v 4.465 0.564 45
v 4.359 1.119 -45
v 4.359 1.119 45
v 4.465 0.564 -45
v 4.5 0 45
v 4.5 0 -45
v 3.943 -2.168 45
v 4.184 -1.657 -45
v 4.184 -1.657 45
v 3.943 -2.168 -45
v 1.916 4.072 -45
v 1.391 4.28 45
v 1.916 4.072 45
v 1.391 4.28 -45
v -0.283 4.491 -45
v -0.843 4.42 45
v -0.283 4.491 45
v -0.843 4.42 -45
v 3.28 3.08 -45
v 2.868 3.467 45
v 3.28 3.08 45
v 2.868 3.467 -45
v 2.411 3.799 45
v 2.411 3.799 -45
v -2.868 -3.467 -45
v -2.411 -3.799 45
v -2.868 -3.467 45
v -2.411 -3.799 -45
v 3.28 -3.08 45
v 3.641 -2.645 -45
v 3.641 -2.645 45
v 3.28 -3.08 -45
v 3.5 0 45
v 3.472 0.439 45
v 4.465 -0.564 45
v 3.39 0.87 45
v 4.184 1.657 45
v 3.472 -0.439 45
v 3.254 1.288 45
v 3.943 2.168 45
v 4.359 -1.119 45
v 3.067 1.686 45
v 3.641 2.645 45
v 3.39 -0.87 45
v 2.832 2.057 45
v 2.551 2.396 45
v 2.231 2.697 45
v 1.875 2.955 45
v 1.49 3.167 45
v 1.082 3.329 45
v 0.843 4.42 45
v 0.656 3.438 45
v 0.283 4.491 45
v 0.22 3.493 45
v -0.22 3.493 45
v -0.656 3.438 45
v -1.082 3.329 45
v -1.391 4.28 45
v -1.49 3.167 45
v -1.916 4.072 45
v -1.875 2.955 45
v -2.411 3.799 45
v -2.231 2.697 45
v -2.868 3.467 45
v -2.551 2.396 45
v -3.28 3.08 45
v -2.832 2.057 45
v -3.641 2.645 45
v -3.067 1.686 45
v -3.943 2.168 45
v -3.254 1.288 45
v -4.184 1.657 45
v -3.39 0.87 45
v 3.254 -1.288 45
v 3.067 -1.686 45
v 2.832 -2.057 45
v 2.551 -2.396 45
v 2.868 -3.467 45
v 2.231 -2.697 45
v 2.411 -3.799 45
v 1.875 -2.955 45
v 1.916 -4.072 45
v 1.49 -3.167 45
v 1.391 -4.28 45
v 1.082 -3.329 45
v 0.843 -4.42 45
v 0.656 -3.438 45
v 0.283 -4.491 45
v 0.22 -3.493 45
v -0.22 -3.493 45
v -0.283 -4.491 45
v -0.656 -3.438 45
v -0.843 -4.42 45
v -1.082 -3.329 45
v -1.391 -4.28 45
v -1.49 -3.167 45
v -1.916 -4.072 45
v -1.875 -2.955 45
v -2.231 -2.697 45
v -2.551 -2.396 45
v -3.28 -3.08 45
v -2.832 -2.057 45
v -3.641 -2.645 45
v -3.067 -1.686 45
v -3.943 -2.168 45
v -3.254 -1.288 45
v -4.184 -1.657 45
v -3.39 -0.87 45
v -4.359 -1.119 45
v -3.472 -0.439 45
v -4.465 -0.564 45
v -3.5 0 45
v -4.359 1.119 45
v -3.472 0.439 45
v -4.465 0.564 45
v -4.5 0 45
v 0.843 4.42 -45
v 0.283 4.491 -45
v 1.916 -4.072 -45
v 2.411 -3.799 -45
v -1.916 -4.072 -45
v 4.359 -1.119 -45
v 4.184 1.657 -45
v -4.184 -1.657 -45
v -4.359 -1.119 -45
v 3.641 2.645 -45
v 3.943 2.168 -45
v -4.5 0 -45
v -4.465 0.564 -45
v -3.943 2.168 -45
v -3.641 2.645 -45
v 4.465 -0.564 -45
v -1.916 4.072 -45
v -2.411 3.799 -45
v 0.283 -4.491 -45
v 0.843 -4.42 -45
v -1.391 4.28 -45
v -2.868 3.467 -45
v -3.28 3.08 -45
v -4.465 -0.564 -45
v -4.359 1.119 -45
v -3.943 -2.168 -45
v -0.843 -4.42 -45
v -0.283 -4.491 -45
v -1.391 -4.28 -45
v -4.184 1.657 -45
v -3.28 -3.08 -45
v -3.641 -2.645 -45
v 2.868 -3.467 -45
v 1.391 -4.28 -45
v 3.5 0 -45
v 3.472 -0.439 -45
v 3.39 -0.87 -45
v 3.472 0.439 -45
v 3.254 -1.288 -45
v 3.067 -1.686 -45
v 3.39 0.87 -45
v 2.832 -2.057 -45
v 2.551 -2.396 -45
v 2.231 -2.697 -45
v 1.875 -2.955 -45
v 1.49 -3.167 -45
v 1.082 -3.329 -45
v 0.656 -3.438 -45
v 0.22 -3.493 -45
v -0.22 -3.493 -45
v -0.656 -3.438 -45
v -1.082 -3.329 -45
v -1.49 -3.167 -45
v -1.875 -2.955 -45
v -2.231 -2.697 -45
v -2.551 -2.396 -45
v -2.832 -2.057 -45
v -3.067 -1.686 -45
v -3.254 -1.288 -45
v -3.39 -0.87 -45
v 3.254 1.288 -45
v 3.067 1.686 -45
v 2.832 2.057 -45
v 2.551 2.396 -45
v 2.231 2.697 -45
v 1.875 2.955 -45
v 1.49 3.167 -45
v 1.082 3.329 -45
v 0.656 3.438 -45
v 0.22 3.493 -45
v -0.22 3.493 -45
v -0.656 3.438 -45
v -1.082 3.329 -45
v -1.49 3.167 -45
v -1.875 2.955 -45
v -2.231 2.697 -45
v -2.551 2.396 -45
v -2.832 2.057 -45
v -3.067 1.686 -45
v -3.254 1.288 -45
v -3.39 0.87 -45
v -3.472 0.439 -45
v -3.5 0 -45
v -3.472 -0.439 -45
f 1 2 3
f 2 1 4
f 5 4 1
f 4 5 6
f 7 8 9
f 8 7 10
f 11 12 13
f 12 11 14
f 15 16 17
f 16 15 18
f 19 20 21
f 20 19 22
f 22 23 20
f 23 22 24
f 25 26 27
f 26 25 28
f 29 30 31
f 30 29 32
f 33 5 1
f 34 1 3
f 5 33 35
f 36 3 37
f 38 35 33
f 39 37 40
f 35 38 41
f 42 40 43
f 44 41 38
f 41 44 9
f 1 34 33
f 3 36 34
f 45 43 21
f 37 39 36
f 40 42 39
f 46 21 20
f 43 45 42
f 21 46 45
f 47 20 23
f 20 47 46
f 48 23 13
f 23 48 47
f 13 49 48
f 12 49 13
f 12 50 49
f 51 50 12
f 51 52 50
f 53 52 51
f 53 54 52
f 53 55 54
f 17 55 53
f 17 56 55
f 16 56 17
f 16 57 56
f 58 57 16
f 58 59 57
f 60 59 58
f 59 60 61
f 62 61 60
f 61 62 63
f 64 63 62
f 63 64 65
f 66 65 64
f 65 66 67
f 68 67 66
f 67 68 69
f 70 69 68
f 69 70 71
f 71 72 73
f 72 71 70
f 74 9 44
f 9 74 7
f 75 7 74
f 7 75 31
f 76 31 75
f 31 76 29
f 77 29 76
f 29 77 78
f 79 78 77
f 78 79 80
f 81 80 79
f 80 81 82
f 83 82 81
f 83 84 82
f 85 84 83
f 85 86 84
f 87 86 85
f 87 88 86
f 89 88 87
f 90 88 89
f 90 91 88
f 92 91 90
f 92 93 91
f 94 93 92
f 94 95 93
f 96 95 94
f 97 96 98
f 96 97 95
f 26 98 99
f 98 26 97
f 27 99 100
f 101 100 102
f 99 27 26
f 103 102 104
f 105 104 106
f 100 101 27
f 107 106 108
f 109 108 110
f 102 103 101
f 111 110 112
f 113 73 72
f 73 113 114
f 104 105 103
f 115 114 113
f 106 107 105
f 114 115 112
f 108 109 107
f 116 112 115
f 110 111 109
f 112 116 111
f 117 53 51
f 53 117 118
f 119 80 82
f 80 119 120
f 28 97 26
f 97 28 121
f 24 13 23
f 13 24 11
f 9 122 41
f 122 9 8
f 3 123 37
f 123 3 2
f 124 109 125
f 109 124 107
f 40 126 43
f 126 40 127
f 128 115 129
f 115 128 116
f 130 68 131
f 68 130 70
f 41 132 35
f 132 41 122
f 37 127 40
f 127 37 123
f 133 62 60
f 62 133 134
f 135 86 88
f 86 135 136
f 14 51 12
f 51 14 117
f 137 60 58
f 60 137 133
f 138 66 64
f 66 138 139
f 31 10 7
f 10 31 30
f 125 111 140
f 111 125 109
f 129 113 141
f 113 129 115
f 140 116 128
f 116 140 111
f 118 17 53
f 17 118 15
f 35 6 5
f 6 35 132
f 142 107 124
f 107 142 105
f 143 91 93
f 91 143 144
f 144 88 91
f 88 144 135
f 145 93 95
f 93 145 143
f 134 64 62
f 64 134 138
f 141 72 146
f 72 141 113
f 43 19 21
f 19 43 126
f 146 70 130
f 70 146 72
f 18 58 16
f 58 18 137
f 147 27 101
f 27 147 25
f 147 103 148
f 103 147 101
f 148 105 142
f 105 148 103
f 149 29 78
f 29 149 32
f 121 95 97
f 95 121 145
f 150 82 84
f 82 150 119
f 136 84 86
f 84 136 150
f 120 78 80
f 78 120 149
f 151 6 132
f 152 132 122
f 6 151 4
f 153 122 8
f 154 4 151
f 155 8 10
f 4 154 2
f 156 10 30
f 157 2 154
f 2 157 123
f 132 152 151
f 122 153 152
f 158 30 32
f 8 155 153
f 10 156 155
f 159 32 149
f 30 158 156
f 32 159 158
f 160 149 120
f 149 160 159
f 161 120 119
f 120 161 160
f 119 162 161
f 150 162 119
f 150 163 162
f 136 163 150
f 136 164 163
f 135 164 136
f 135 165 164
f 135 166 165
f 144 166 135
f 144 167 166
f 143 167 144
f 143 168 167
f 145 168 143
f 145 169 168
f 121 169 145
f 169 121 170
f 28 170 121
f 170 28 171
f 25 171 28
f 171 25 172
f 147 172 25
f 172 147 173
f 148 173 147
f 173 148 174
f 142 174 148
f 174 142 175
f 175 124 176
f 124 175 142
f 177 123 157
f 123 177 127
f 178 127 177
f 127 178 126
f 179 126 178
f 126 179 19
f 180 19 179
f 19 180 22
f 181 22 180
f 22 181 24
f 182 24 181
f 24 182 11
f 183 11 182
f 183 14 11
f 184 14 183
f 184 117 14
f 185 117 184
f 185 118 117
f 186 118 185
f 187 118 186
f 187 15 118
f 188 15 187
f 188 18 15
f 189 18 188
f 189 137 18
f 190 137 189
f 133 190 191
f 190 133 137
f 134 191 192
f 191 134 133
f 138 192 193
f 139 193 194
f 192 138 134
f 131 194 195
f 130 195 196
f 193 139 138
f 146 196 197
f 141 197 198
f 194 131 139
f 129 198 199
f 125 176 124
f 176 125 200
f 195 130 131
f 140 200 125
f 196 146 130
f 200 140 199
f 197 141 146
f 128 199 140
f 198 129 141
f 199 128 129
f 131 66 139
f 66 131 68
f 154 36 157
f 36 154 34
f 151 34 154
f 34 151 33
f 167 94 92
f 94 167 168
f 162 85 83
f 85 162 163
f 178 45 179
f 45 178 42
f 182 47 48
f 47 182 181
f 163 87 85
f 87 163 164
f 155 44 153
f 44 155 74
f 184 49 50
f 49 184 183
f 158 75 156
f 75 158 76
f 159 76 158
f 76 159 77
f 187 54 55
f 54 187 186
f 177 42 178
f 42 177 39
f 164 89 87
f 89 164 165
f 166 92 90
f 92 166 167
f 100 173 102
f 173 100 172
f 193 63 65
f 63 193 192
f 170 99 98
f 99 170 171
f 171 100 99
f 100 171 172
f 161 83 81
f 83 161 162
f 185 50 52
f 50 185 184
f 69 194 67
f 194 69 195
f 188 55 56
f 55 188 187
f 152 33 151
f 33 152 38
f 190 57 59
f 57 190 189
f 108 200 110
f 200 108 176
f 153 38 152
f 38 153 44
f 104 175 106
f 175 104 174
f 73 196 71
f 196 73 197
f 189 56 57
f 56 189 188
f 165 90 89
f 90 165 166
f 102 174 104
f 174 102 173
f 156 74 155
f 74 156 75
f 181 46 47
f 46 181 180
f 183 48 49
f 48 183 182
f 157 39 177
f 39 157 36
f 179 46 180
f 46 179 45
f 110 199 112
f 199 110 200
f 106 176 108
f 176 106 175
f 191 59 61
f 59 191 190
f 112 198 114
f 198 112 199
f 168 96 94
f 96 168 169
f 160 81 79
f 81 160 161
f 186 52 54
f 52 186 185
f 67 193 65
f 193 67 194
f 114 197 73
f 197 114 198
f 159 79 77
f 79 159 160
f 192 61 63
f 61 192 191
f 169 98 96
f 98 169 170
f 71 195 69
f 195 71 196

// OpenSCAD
$fn = 50;


difference() {
	union() {
		translate(v = [0, 0, -45.0000000000]) {
			cylinder(h = 90, r = 4.5000000000);
		}
	}
	union() {
		translate(v = [0, 0, -100.0000000000]) {
			cylinder(h = 200, r = 3.5000000000);
		}
	}
}
